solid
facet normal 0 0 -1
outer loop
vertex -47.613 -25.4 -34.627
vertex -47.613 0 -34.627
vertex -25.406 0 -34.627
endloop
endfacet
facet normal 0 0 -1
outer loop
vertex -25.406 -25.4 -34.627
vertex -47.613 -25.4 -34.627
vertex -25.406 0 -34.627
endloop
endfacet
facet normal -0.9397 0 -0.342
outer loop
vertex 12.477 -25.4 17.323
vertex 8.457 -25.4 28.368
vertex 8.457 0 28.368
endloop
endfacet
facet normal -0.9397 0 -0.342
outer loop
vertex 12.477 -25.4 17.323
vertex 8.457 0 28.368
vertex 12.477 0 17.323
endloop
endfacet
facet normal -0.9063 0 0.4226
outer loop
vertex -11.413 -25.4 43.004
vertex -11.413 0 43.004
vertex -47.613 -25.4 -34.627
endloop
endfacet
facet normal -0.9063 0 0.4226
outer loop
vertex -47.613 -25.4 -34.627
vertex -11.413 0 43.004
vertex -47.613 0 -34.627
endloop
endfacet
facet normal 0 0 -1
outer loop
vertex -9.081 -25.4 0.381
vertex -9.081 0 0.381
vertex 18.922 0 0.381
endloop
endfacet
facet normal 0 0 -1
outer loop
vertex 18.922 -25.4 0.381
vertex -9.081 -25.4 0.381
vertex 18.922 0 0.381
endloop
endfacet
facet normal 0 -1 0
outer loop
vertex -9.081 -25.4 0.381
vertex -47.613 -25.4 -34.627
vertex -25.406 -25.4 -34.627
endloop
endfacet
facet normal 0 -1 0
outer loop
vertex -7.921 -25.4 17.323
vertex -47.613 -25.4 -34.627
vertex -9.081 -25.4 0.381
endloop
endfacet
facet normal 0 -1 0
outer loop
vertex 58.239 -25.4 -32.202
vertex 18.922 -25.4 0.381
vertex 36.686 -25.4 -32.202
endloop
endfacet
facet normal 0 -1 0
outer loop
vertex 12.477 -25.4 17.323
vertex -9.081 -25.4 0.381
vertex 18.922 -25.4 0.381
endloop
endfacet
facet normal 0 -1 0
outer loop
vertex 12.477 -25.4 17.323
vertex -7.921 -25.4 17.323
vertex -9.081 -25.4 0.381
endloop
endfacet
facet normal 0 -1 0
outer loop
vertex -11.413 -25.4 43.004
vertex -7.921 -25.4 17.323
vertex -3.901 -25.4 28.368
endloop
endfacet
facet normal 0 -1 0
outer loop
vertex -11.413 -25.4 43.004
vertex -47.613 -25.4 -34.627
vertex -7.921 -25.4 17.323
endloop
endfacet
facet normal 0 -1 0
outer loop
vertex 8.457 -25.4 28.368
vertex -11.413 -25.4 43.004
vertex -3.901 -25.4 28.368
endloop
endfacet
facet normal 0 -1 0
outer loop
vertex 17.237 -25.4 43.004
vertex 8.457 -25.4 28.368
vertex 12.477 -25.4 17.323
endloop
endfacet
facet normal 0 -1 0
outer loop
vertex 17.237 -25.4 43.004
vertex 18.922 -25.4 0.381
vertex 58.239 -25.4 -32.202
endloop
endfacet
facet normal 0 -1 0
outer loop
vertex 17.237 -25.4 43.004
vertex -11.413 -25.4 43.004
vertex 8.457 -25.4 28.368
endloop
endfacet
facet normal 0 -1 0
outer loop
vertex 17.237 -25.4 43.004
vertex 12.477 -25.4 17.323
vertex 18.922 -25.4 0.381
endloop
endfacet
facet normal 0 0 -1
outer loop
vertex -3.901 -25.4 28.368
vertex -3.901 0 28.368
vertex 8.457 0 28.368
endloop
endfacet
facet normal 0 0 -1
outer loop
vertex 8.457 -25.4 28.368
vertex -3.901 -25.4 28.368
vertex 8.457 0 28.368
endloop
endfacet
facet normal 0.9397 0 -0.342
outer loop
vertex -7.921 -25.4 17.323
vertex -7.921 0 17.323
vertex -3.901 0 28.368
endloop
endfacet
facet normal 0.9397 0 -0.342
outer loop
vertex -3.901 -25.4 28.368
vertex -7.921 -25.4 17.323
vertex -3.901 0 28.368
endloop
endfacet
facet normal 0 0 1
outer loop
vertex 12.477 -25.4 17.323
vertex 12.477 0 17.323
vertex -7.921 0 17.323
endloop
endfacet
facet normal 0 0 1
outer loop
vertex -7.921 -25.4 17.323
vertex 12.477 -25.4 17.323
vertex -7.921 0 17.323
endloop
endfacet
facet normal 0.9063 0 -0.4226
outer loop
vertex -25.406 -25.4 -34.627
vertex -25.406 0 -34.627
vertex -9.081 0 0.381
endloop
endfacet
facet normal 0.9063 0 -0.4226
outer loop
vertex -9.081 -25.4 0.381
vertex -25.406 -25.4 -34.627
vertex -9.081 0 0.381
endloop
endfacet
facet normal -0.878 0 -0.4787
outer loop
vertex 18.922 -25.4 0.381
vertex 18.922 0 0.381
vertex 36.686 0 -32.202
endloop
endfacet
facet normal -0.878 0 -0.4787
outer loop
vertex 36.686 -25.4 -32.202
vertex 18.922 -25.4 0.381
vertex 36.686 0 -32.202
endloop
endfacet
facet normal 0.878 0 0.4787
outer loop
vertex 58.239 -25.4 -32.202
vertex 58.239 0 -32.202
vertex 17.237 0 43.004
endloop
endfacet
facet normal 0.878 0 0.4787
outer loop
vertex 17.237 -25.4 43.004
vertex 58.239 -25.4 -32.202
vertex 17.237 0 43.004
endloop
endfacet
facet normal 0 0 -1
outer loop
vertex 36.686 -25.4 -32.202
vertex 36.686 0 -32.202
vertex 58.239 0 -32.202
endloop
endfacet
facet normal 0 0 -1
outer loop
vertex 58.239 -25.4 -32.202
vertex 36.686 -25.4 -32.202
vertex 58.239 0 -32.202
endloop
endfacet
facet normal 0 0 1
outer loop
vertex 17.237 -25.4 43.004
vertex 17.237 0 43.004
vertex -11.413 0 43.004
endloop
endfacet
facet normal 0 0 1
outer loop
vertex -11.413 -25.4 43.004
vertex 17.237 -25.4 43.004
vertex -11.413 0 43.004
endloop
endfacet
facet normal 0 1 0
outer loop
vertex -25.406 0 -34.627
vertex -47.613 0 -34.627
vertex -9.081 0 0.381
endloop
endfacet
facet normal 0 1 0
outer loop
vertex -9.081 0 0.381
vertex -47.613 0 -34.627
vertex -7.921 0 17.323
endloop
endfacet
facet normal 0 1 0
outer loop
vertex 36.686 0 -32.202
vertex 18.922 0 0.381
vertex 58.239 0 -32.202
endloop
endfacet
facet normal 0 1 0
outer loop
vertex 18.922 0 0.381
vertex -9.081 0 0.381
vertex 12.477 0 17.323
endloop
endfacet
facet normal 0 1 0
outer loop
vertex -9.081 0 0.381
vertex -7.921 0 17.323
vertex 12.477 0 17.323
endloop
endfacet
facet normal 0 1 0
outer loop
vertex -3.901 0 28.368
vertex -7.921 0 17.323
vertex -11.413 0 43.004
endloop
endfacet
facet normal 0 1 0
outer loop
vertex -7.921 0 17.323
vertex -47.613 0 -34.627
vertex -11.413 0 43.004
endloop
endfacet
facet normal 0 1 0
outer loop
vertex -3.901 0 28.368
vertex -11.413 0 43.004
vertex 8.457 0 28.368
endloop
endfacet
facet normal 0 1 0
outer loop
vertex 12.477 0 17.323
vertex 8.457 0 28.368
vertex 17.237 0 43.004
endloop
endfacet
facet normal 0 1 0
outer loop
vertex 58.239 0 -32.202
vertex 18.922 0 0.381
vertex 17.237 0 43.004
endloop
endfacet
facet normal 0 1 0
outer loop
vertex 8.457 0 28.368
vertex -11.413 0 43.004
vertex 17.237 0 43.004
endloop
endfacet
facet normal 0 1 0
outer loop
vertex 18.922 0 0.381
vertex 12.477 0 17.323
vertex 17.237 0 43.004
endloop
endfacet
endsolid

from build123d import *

# Parameters (mm, degrees)
F1_DEPTH = 25.4


with BuildPart() as f1:
    # F0 (on Front) → F1 (new body)
    with BuildSketch(Plane.XZ):
        Polygon((-11.412839, 43.004113), (-47.613019, -34.627423), (-25.406242, -34.627423), (-9.081334, 0.381454), (18.921843, 0.381454), (36.686134, -32.201932), (58.23868, -32.201932), (17.236739, 43.004113), align=None)
        Polygon((-7.921455, 17.322859), (-3.90137, 28.367954), (8.457227, 28.367954), (12.477313, 17.322859), align=None, mode=Mode.SUBTRACT)
    extrude(amount=F1_DEPTH)


solid = f1.part
